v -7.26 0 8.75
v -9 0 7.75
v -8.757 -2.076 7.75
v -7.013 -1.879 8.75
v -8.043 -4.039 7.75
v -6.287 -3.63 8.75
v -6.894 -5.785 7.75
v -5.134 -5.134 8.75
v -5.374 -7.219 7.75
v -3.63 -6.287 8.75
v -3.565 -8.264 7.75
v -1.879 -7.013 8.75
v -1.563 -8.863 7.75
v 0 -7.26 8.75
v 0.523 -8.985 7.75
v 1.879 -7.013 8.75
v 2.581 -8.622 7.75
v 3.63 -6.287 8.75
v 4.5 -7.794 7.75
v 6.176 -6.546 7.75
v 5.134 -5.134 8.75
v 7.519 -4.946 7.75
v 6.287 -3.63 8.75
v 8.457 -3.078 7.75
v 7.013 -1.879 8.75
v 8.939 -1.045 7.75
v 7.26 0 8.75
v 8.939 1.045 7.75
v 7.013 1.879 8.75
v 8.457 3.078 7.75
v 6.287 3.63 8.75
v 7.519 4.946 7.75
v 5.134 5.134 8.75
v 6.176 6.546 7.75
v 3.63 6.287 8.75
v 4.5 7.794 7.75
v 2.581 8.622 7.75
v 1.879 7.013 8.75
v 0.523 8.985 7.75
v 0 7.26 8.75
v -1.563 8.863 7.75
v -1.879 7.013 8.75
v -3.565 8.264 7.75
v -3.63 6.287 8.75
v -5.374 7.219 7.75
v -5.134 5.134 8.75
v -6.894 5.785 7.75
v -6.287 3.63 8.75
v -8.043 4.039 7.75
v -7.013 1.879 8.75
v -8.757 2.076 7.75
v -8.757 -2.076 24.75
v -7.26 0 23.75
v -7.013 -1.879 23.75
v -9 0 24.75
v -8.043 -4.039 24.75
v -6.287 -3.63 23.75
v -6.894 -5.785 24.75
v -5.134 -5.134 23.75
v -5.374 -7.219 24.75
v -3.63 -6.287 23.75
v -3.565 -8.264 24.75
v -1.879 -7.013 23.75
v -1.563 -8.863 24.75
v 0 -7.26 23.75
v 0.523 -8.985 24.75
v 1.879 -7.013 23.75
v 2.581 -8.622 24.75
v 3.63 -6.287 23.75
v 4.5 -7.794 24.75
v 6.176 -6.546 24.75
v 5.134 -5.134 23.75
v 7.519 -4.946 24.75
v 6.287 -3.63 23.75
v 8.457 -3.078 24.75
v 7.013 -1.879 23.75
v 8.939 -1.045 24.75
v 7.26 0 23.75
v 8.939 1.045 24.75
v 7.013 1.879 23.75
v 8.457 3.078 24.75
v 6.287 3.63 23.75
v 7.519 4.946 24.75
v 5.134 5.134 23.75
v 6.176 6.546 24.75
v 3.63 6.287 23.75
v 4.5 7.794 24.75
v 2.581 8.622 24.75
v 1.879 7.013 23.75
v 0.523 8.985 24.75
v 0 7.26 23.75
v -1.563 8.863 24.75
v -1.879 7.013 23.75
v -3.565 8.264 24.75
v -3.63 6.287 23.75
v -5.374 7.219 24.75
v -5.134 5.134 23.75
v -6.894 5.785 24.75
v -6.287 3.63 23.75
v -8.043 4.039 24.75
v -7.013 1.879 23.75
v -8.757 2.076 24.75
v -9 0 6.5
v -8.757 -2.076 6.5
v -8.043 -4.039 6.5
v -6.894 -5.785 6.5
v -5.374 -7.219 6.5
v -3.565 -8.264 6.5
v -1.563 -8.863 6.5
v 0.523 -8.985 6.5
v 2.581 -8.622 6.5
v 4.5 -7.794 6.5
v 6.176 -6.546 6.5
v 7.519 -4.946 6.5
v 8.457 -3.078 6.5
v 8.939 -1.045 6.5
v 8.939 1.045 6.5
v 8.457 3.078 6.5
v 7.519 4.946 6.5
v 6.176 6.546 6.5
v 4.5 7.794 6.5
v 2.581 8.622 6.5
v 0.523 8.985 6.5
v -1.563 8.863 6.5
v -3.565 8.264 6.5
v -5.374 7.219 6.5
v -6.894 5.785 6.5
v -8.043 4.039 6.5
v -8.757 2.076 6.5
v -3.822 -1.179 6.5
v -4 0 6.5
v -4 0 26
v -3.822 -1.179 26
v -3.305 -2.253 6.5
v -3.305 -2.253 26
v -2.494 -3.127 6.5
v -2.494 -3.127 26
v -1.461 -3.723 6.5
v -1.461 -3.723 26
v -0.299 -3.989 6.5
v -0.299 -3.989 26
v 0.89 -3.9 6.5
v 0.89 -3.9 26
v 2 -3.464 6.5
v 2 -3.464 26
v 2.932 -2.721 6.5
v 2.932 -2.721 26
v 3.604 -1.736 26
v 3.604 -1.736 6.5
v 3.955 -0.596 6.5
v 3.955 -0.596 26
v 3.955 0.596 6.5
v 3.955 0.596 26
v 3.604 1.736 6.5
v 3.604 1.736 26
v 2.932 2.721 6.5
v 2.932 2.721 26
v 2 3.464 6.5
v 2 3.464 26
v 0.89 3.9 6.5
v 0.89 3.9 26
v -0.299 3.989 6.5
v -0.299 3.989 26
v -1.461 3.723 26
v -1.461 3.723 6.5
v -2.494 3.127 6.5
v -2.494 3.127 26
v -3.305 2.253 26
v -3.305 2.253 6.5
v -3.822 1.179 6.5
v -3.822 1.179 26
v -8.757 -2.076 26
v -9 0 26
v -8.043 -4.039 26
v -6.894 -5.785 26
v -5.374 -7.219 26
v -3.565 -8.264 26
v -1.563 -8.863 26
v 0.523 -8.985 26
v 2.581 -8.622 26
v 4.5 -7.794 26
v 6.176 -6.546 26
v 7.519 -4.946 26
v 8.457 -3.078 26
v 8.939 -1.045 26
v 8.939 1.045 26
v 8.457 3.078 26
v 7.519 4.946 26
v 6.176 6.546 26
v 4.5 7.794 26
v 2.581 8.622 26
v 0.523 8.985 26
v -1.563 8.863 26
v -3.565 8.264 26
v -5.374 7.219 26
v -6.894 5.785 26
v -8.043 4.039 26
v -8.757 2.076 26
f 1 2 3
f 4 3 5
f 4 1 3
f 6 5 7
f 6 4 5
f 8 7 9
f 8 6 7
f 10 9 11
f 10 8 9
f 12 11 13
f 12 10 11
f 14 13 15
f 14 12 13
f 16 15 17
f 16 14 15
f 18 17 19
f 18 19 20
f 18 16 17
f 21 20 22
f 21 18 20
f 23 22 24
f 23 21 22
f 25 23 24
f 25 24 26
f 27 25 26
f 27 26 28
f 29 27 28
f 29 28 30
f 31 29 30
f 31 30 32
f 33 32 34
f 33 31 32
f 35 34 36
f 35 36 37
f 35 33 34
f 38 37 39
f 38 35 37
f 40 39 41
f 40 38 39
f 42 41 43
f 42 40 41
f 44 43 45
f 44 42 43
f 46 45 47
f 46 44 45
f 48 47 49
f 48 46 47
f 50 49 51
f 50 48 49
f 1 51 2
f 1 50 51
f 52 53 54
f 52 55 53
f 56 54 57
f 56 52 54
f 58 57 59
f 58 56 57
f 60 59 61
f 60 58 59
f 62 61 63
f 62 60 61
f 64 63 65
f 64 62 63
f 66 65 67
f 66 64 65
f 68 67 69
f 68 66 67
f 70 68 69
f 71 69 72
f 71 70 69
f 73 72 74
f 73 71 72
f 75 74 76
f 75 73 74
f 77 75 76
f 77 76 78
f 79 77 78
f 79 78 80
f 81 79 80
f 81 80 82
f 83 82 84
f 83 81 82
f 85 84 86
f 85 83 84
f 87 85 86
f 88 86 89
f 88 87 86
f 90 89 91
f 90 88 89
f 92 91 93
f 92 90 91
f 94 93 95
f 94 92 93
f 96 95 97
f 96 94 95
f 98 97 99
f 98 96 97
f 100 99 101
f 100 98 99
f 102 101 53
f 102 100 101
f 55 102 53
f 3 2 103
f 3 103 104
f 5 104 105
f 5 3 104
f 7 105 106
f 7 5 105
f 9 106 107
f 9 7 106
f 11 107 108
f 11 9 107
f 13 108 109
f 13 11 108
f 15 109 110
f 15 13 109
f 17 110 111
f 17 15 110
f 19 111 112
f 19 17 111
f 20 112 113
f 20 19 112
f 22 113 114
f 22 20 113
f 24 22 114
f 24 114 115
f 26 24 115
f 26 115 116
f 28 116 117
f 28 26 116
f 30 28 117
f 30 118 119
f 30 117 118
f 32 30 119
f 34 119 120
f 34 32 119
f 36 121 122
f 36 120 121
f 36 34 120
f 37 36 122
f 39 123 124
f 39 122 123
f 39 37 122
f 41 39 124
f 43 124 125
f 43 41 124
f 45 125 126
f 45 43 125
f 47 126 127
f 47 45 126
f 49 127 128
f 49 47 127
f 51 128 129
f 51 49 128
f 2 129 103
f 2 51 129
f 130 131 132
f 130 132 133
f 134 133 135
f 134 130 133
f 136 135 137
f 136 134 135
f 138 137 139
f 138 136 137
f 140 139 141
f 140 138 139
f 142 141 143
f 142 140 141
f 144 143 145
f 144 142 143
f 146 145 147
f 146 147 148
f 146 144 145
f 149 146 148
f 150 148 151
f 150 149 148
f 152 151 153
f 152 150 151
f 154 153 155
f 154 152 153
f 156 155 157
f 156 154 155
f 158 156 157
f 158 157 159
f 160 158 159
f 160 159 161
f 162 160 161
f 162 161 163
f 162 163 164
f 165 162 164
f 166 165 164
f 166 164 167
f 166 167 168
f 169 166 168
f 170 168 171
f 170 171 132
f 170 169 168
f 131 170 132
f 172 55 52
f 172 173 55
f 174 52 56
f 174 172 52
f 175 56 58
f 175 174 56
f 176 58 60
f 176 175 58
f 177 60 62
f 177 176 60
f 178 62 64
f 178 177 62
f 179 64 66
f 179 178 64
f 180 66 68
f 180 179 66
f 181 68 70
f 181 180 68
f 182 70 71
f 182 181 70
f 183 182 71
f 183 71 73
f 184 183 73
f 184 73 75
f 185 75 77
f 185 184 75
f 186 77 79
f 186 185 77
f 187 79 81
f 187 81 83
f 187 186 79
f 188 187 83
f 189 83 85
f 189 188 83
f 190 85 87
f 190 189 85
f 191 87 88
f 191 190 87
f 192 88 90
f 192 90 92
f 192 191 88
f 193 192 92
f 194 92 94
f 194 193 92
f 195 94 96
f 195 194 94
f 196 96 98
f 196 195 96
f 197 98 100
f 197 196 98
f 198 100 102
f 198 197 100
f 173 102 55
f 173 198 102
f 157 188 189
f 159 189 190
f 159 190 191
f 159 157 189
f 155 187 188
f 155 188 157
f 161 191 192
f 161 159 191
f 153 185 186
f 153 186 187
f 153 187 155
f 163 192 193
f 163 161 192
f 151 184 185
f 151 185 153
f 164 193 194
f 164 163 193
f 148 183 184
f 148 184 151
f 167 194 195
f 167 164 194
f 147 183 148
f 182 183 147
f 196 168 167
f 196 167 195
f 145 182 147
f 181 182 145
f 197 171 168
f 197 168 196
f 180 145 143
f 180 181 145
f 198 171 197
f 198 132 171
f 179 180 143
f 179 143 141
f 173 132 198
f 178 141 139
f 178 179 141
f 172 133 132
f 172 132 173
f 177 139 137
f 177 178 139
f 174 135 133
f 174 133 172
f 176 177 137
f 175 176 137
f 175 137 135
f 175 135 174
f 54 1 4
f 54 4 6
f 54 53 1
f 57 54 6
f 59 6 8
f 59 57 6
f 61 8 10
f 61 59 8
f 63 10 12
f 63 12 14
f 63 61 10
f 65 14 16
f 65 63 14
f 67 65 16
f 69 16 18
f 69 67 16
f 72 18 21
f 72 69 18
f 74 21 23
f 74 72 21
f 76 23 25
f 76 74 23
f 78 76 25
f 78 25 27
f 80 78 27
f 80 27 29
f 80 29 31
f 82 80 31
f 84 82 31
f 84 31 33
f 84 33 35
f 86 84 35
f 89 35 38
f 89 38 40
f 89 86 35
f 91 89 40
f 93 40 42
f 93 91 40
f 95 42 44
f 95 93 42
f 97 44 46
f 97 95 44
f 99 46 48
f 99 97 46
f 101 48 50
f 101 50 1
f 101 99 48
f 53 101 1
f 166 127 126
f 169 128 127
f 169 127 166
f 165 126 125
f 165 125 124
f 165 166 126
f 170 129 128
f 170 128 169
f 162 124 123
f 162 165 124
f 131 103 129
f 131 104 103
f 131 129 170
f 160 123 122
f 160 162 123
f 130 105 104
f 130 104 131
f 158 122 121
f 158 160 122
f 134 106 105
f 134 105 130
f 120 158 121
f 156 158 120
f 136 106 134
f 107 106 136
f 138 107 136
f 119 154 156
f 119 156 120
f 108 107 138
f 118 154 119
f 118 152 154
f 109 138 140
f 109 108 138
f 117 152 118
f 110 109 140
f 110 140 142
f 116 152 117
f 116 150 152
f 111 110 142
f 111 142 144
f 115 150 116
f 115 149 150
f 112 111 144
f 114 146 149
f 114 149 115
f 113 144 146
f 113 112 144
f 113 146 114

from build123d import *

# Parameters (mm, degrees)
ODEBRAT_VYSUNUT_M1_DEPTH      = 29.948229652
ODEBRAT_VYSUNUT_M1_DEPTH_BACK = 29.948229652
SKICA2_W                      = 9.5
SKICA2_H                      = 6.5


with BuildPart() as part:
    # Skica1 → Rotovat1 (revolve)
    with BuildSketch(Plane(origin=(0, 0, 0), x_dir=(0, 0, -1), z_dir=(1, 0, 0)), mode=Mode.PRIVATE) as rotovat1_sk:
        Polygon((0, 4), (0, 4.75), (-6.5, 4.75), (-6.5, 9), (-7.75, 9), (-8.75, 7.26), (-23.75, 7.26), (-24.75, 9), (-26, 9), (-26, 4), align=None)
    revolve(rotovat1_sk.sketch.rotate(Axis((0, 0, 0), (0, 0, 1)), 90), axis=Axis((0, 0, 0), (0, 0, 1)))

    # Skica2 → Odebrat vysunutím1 (cut, two sides: drawn at the far end of the back side and taken through both)
    with BuildSketch(Plane(origin=(0, 0, 0), x_dir=(1, 0, 0), z_dir=(0, 1, 0)).offset(-ODEBRAT_VYSUNUT_M1_DEPTH_BACK)):
        with Locations((0, -3.25)):
            Rectangle(SKICA2_W, SKICA2_H)
    extrude(amount=ODEBRAT_VYSUNUT_M1_DEPTH + ODEBRAT_VYSUNUT_M1_DEPTH_BACK, mode=Mode.SUBTRACT)


solid = part.part
